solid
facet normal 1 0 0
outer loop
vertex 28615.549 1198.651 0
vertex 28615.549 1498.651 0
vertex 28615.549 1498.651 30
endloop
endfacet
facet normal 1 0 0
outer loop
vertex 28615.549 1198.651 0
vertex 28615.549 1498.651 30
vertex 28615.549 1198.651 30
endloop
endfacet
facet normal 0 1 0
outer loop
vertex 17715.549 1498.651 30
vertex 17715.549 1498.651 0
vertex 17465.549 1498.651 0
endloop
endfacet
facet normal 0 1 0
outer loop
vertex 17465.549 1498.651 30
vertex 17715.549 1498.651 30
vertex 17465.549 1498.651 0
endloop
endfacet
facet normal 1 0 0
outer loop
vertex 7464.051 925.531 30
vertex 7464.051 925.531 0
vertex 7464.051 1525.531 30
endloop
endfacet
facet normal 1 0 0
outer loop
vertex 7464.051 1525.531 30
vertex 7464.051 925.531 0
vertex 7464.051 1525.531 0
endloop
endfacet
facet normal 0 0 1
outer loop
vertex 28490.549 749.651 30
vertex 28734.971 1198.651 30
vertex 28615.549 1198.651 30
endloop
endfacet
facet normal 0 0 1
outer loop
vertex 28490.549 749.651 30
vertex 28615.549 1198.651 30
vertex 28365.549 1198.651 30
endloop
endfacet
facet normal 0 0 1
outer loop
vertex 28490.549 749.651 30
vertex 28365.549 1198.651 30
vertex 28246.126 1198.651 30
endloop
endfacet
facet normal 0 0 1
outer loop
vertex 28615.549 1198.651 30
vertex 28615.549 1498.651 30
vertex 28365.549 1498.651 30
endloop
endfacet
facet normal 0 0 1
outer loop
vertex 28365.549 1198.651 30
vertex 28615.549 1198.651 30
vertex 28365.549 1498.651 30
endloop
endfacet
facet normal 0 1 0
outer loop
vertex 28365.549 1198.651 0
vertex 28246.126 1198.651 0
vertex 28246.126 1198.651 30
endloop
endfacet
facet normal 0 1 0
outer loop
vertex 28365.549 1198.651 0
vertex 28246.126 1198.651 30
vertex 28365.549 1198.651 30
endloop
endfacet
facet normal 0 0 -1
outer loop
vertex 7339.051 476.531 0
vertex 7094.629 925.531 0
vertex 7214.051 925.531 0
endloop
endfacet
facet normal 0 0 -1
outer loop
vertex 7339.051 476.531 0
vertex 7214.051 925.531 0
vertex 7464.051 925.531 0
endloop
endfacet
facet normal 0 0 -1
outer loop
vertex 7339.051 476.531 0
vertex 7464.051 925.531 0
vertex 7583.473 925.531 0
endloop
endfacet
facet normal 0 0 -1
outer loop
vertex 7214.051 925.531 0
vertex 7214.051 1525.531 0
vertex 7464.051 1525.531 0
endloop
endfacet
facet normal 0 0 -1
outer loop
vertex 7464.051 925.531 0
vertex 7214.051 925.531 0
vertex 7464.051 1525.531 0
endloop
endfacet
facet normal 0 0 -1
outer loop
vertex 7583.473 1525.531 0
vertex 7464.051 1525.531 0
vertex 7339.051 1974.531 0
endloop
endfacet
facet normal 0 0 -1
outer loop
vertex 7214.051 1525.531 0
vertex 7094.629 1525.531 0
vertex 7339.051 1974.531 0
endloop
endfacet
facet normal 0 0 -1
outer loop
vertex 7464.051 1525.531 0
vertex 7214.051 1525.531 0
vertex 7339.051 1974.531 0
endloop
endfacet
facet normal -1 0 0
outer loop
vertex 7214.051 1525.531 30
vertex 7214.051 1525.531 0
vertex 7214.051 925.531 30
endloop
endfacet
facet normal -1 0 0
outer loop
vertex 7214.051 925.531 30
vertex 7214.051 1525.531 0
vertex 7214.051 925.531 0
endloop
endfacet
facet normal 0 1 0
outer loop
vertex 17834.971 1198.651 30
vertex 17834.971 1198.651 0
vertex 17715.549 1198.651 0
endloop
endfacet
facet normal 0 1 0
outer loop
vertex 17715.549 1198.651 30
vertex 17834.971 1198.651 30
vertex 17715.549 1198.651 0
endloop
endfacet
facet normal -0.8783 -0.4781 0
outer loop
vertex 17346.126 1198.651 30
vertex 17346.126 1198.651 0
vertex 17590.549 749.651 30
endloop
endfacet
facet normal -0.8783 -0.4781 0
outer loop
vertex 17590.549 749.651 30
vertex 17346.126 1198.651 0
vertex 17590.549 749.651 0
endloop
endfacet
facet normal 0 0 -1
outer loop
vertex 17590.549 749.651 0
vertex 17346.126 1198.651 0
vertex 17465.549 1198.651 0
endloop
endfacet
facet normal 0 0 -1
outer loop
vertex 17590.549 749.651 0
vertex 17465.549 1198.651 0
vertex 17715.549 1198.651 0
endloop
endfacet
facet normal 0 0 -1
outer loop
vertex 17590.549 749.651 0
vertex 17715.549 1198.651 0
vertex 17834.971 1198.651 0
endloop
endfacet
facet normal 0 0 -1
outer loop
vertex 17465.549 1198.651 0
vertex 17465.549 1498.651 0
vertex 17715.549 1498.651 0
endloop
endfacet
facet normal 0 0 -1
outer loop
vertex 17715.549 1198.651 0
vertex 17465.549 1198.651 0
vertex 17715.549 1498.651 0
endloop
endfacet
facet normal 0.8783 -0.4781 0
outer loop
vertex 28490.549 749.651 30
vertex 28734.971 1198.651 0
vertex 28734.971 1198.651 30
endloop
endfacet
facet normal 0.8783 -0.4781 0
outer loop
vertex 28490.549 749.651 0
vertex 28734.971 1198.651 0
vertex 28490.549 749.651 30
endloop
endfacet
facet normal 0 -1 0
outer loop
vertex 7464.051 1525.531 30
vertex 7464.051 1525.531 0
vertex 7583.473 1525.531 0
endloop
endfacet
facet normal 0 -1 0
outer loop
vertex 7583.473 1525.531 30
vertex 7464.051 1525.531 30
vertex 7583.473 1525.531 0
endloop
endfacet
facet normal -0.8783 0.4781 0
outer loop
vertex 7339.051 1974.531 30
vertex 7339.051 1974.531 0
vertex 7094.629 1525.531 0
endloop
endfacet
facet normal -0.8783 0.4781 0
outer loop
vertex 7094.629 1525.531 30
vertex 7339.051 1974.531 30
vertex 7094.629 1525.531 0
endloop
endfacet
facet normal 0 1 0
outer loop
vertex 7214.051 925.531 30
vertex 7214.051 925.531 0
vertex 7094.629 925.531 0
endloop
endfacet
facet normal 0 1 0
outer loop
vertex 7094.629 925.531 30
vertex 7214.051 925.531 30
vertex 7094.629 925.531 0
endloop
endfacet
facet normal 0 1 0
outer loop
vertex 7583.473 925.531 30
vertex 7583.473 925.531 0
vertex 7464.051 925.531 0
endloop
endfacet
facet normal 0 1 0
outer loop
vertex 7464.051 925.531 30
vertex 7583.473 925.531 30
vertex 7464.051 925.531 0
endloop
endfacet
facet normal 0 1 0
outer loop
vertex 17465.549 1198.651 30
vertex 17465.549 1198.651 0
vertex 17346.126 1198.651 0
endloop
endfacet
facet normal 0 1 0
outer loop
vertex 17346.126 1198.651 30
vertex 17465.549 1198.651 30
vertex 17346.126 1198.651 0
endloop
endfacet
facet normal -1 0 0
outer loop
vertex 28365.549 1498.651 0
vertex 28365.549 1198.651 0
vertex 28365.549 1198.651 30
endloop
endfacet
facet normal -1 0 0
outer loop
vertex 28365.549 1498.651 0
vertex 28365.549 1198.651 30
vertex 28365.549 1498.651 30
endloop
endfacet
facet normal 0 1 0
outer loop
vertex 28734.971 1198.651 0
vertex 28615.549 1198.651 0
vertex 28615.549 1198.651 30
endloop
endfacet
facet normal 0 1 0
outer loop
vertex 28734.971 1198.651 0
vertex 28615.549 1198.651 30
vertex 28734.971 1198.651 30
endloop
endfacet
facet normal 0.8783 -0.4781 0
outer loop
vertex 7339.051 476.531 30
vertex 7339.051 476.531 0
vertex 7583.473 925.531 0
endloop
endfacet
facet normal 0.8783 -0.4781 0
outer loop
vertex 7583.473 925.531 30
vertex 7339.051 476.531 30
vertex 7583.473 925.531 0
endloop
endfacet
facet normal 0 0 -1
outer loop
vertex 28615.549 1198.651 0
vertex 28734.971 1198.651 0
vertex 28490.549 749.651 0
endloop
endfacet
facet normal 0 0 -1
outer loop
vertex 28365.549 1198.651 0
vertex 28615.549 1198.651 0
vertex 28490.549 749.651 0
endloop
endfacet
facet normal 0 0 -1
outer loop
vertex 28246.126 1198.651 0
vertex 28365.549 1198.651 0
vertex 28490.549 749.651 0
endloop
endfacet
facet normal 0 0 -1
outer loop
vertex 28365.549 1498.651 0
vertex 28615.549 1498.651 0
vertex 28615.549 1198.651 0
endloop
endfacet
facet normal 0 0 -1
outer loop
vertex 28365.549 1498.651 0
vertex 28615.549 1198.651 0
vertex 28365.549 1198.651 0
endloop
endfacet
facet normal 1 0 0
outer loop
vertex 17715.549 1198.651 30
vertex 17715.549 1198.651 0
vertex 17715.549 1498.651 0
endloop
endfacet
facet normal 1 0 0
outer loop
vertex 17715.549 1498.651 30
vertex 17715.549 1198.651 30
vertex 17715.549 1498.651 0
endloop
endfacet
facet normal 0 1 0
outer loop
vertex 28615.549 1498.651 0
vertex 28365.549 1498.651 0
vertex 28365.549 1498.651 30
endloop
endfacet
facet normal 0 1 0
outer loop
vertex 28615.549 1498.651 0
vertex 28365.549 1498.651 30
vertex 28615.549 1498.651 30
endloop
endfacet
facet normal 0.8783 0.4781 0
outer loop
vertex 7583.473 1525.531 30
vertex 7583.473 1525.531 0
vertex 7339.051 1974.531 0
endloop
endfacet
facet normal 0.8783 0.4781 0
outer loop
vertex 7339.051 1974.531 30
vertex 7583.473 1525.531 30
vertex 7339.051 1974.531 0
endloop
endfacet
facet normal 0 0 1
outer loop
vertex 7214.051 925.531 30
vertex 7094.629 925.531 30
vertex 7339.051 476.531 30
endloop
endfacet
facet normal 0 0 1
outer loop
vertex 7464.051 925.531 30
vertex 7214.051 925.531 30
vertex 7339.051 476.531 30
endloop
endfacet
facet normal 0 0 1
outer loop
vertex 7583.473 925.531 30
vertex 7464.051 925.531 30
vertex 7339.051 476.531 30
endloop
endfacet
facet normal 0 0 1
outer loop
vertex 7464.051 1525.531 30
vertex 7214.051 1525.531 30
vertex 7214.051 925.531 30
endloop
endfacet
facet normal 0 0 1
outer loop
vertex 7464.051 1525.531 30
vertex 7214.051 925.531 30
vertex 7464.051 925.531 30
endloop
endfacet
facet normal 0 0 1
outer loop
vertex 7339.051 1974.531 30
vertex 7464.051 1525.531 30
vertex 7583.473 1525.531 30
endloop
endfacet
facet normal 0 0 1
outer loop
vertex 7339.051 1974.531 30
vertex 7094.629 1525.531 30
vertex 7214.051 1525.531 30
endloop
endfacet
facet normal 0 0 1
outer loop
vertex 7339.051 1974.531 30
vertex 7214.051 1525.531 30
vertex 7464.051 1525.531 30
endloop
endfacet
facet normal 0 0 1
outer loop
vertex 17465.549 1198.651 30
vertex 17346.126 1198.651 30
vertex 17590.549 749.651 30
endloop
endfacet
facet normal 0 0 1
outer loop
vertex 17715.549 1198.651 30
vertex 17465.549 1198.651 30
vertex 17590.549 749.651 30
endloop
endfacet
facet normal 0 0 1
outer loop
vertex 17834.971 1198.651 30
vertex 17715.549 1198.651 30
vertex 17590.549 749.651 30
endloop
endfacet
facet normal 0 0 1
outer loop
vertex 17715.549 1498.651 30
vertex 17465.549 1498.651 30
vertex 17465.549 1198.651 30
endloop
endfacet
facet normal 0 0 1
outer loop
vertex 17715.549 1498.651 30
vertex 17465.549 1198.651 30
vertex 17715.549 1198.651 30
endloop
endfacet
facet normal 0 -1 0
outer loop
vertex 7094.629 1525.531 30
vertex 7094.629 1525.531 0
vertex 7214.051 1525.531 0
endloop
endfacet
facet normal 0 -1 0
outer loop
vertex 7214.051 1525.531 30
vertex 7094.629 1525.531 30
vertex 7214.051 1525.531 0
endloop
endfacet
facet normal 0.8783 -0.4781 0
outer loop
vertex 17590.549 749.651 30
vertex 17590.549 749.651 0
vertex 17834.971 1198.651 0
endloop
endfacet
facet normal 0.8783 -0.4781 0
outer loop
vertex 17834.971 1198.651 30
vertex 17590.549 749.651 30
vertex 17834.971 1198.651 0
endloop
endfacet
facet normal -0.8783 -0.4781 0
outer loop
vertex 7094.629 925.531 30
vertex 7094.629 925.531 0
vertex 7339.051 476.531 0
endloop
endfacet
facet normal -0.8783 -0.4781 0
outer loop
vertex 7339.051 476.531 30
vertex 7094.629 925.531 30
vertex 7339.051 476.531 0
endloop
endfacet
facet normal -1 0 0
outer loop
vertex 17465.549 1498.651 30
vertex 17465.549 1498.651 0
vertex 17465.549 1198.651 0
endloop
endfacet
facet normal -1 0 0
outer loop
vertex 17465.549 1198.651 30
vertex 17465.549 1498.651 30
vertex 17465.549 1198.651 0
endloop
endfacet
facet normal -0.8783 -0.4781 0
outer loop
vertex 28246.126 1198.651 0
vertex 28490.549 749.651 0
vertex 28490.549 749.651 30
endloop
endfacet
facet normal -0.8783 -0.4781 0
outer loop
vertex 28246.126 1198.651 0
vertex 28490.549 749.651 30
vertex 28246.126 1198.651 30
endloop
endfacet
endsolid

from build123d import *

# Parameters (mm, degrees)
BOSS_EXTRUDE1_DEPTH   = 30
BOSS_EXTRUDE1_2_DEPTH = 30
BOSS_EXTRUDE1_3_DEPTH = 30


with BuildPart() as part:
    # Sketch1 → Boss-Extrude1 (new body)
    with BuildSketch(Plane.XY):
        Polygon((7464.051241567, 925.53062986), (7464.051241567, 1525.53062986), (7583.473483246, 1525.53062986), (7339.051241567, 1974.530546162), (7094.628999888, 1525.53062986), (7214.051241567, 1525.53062986), (7214.051241567, 925.53062986), (7094.628999888, 925.53062986), (7339.051241567, 476.530713559), (7583.473483246, 925.53062986), align=None)
    extrude(amount=BOSS_EXTRUDE1_DEPTH)


with BuildPart() as body_2:
    # Sketch1 → Boss-Extrude1 2 (new body)
    with BuildSketch(Plane.XY):
        Polygon((17715.548618468, 1198.65057849), (17715.548618468, 1498.65057849), (17465.548618468, 1498.65057849), (17465.548618468, 1198.65057849), (17346.126376789, 1198.65057849), (17590.548618468, 749.650662188), (17834.970860147, 1198.65057849), align=None)
    extrude(amount=BOSS_EXTRUDE1_2_DEPTH)


with BuildPart() as body_3:
    # Sketch1 → Boss-Extrude1 3 (new body)
    with BuildSketch(Plane.XY):
        Polygon((28734.970860147, 1198.65057849), (28490.548618468, 749.650662188), (28246.126376789, 1198.65057849), (28365.548618468, 1198.65057849), (28365.548618468, 1498.65057849), (28615.548618468, 1498.65057849), (28615.548618468, 1198.65057849), align=None)
    extrude(amount=BOSS_EXTRUDE1_3_DEPTH)


solid = Compound([part.part, body_2.part, body_3.part])
